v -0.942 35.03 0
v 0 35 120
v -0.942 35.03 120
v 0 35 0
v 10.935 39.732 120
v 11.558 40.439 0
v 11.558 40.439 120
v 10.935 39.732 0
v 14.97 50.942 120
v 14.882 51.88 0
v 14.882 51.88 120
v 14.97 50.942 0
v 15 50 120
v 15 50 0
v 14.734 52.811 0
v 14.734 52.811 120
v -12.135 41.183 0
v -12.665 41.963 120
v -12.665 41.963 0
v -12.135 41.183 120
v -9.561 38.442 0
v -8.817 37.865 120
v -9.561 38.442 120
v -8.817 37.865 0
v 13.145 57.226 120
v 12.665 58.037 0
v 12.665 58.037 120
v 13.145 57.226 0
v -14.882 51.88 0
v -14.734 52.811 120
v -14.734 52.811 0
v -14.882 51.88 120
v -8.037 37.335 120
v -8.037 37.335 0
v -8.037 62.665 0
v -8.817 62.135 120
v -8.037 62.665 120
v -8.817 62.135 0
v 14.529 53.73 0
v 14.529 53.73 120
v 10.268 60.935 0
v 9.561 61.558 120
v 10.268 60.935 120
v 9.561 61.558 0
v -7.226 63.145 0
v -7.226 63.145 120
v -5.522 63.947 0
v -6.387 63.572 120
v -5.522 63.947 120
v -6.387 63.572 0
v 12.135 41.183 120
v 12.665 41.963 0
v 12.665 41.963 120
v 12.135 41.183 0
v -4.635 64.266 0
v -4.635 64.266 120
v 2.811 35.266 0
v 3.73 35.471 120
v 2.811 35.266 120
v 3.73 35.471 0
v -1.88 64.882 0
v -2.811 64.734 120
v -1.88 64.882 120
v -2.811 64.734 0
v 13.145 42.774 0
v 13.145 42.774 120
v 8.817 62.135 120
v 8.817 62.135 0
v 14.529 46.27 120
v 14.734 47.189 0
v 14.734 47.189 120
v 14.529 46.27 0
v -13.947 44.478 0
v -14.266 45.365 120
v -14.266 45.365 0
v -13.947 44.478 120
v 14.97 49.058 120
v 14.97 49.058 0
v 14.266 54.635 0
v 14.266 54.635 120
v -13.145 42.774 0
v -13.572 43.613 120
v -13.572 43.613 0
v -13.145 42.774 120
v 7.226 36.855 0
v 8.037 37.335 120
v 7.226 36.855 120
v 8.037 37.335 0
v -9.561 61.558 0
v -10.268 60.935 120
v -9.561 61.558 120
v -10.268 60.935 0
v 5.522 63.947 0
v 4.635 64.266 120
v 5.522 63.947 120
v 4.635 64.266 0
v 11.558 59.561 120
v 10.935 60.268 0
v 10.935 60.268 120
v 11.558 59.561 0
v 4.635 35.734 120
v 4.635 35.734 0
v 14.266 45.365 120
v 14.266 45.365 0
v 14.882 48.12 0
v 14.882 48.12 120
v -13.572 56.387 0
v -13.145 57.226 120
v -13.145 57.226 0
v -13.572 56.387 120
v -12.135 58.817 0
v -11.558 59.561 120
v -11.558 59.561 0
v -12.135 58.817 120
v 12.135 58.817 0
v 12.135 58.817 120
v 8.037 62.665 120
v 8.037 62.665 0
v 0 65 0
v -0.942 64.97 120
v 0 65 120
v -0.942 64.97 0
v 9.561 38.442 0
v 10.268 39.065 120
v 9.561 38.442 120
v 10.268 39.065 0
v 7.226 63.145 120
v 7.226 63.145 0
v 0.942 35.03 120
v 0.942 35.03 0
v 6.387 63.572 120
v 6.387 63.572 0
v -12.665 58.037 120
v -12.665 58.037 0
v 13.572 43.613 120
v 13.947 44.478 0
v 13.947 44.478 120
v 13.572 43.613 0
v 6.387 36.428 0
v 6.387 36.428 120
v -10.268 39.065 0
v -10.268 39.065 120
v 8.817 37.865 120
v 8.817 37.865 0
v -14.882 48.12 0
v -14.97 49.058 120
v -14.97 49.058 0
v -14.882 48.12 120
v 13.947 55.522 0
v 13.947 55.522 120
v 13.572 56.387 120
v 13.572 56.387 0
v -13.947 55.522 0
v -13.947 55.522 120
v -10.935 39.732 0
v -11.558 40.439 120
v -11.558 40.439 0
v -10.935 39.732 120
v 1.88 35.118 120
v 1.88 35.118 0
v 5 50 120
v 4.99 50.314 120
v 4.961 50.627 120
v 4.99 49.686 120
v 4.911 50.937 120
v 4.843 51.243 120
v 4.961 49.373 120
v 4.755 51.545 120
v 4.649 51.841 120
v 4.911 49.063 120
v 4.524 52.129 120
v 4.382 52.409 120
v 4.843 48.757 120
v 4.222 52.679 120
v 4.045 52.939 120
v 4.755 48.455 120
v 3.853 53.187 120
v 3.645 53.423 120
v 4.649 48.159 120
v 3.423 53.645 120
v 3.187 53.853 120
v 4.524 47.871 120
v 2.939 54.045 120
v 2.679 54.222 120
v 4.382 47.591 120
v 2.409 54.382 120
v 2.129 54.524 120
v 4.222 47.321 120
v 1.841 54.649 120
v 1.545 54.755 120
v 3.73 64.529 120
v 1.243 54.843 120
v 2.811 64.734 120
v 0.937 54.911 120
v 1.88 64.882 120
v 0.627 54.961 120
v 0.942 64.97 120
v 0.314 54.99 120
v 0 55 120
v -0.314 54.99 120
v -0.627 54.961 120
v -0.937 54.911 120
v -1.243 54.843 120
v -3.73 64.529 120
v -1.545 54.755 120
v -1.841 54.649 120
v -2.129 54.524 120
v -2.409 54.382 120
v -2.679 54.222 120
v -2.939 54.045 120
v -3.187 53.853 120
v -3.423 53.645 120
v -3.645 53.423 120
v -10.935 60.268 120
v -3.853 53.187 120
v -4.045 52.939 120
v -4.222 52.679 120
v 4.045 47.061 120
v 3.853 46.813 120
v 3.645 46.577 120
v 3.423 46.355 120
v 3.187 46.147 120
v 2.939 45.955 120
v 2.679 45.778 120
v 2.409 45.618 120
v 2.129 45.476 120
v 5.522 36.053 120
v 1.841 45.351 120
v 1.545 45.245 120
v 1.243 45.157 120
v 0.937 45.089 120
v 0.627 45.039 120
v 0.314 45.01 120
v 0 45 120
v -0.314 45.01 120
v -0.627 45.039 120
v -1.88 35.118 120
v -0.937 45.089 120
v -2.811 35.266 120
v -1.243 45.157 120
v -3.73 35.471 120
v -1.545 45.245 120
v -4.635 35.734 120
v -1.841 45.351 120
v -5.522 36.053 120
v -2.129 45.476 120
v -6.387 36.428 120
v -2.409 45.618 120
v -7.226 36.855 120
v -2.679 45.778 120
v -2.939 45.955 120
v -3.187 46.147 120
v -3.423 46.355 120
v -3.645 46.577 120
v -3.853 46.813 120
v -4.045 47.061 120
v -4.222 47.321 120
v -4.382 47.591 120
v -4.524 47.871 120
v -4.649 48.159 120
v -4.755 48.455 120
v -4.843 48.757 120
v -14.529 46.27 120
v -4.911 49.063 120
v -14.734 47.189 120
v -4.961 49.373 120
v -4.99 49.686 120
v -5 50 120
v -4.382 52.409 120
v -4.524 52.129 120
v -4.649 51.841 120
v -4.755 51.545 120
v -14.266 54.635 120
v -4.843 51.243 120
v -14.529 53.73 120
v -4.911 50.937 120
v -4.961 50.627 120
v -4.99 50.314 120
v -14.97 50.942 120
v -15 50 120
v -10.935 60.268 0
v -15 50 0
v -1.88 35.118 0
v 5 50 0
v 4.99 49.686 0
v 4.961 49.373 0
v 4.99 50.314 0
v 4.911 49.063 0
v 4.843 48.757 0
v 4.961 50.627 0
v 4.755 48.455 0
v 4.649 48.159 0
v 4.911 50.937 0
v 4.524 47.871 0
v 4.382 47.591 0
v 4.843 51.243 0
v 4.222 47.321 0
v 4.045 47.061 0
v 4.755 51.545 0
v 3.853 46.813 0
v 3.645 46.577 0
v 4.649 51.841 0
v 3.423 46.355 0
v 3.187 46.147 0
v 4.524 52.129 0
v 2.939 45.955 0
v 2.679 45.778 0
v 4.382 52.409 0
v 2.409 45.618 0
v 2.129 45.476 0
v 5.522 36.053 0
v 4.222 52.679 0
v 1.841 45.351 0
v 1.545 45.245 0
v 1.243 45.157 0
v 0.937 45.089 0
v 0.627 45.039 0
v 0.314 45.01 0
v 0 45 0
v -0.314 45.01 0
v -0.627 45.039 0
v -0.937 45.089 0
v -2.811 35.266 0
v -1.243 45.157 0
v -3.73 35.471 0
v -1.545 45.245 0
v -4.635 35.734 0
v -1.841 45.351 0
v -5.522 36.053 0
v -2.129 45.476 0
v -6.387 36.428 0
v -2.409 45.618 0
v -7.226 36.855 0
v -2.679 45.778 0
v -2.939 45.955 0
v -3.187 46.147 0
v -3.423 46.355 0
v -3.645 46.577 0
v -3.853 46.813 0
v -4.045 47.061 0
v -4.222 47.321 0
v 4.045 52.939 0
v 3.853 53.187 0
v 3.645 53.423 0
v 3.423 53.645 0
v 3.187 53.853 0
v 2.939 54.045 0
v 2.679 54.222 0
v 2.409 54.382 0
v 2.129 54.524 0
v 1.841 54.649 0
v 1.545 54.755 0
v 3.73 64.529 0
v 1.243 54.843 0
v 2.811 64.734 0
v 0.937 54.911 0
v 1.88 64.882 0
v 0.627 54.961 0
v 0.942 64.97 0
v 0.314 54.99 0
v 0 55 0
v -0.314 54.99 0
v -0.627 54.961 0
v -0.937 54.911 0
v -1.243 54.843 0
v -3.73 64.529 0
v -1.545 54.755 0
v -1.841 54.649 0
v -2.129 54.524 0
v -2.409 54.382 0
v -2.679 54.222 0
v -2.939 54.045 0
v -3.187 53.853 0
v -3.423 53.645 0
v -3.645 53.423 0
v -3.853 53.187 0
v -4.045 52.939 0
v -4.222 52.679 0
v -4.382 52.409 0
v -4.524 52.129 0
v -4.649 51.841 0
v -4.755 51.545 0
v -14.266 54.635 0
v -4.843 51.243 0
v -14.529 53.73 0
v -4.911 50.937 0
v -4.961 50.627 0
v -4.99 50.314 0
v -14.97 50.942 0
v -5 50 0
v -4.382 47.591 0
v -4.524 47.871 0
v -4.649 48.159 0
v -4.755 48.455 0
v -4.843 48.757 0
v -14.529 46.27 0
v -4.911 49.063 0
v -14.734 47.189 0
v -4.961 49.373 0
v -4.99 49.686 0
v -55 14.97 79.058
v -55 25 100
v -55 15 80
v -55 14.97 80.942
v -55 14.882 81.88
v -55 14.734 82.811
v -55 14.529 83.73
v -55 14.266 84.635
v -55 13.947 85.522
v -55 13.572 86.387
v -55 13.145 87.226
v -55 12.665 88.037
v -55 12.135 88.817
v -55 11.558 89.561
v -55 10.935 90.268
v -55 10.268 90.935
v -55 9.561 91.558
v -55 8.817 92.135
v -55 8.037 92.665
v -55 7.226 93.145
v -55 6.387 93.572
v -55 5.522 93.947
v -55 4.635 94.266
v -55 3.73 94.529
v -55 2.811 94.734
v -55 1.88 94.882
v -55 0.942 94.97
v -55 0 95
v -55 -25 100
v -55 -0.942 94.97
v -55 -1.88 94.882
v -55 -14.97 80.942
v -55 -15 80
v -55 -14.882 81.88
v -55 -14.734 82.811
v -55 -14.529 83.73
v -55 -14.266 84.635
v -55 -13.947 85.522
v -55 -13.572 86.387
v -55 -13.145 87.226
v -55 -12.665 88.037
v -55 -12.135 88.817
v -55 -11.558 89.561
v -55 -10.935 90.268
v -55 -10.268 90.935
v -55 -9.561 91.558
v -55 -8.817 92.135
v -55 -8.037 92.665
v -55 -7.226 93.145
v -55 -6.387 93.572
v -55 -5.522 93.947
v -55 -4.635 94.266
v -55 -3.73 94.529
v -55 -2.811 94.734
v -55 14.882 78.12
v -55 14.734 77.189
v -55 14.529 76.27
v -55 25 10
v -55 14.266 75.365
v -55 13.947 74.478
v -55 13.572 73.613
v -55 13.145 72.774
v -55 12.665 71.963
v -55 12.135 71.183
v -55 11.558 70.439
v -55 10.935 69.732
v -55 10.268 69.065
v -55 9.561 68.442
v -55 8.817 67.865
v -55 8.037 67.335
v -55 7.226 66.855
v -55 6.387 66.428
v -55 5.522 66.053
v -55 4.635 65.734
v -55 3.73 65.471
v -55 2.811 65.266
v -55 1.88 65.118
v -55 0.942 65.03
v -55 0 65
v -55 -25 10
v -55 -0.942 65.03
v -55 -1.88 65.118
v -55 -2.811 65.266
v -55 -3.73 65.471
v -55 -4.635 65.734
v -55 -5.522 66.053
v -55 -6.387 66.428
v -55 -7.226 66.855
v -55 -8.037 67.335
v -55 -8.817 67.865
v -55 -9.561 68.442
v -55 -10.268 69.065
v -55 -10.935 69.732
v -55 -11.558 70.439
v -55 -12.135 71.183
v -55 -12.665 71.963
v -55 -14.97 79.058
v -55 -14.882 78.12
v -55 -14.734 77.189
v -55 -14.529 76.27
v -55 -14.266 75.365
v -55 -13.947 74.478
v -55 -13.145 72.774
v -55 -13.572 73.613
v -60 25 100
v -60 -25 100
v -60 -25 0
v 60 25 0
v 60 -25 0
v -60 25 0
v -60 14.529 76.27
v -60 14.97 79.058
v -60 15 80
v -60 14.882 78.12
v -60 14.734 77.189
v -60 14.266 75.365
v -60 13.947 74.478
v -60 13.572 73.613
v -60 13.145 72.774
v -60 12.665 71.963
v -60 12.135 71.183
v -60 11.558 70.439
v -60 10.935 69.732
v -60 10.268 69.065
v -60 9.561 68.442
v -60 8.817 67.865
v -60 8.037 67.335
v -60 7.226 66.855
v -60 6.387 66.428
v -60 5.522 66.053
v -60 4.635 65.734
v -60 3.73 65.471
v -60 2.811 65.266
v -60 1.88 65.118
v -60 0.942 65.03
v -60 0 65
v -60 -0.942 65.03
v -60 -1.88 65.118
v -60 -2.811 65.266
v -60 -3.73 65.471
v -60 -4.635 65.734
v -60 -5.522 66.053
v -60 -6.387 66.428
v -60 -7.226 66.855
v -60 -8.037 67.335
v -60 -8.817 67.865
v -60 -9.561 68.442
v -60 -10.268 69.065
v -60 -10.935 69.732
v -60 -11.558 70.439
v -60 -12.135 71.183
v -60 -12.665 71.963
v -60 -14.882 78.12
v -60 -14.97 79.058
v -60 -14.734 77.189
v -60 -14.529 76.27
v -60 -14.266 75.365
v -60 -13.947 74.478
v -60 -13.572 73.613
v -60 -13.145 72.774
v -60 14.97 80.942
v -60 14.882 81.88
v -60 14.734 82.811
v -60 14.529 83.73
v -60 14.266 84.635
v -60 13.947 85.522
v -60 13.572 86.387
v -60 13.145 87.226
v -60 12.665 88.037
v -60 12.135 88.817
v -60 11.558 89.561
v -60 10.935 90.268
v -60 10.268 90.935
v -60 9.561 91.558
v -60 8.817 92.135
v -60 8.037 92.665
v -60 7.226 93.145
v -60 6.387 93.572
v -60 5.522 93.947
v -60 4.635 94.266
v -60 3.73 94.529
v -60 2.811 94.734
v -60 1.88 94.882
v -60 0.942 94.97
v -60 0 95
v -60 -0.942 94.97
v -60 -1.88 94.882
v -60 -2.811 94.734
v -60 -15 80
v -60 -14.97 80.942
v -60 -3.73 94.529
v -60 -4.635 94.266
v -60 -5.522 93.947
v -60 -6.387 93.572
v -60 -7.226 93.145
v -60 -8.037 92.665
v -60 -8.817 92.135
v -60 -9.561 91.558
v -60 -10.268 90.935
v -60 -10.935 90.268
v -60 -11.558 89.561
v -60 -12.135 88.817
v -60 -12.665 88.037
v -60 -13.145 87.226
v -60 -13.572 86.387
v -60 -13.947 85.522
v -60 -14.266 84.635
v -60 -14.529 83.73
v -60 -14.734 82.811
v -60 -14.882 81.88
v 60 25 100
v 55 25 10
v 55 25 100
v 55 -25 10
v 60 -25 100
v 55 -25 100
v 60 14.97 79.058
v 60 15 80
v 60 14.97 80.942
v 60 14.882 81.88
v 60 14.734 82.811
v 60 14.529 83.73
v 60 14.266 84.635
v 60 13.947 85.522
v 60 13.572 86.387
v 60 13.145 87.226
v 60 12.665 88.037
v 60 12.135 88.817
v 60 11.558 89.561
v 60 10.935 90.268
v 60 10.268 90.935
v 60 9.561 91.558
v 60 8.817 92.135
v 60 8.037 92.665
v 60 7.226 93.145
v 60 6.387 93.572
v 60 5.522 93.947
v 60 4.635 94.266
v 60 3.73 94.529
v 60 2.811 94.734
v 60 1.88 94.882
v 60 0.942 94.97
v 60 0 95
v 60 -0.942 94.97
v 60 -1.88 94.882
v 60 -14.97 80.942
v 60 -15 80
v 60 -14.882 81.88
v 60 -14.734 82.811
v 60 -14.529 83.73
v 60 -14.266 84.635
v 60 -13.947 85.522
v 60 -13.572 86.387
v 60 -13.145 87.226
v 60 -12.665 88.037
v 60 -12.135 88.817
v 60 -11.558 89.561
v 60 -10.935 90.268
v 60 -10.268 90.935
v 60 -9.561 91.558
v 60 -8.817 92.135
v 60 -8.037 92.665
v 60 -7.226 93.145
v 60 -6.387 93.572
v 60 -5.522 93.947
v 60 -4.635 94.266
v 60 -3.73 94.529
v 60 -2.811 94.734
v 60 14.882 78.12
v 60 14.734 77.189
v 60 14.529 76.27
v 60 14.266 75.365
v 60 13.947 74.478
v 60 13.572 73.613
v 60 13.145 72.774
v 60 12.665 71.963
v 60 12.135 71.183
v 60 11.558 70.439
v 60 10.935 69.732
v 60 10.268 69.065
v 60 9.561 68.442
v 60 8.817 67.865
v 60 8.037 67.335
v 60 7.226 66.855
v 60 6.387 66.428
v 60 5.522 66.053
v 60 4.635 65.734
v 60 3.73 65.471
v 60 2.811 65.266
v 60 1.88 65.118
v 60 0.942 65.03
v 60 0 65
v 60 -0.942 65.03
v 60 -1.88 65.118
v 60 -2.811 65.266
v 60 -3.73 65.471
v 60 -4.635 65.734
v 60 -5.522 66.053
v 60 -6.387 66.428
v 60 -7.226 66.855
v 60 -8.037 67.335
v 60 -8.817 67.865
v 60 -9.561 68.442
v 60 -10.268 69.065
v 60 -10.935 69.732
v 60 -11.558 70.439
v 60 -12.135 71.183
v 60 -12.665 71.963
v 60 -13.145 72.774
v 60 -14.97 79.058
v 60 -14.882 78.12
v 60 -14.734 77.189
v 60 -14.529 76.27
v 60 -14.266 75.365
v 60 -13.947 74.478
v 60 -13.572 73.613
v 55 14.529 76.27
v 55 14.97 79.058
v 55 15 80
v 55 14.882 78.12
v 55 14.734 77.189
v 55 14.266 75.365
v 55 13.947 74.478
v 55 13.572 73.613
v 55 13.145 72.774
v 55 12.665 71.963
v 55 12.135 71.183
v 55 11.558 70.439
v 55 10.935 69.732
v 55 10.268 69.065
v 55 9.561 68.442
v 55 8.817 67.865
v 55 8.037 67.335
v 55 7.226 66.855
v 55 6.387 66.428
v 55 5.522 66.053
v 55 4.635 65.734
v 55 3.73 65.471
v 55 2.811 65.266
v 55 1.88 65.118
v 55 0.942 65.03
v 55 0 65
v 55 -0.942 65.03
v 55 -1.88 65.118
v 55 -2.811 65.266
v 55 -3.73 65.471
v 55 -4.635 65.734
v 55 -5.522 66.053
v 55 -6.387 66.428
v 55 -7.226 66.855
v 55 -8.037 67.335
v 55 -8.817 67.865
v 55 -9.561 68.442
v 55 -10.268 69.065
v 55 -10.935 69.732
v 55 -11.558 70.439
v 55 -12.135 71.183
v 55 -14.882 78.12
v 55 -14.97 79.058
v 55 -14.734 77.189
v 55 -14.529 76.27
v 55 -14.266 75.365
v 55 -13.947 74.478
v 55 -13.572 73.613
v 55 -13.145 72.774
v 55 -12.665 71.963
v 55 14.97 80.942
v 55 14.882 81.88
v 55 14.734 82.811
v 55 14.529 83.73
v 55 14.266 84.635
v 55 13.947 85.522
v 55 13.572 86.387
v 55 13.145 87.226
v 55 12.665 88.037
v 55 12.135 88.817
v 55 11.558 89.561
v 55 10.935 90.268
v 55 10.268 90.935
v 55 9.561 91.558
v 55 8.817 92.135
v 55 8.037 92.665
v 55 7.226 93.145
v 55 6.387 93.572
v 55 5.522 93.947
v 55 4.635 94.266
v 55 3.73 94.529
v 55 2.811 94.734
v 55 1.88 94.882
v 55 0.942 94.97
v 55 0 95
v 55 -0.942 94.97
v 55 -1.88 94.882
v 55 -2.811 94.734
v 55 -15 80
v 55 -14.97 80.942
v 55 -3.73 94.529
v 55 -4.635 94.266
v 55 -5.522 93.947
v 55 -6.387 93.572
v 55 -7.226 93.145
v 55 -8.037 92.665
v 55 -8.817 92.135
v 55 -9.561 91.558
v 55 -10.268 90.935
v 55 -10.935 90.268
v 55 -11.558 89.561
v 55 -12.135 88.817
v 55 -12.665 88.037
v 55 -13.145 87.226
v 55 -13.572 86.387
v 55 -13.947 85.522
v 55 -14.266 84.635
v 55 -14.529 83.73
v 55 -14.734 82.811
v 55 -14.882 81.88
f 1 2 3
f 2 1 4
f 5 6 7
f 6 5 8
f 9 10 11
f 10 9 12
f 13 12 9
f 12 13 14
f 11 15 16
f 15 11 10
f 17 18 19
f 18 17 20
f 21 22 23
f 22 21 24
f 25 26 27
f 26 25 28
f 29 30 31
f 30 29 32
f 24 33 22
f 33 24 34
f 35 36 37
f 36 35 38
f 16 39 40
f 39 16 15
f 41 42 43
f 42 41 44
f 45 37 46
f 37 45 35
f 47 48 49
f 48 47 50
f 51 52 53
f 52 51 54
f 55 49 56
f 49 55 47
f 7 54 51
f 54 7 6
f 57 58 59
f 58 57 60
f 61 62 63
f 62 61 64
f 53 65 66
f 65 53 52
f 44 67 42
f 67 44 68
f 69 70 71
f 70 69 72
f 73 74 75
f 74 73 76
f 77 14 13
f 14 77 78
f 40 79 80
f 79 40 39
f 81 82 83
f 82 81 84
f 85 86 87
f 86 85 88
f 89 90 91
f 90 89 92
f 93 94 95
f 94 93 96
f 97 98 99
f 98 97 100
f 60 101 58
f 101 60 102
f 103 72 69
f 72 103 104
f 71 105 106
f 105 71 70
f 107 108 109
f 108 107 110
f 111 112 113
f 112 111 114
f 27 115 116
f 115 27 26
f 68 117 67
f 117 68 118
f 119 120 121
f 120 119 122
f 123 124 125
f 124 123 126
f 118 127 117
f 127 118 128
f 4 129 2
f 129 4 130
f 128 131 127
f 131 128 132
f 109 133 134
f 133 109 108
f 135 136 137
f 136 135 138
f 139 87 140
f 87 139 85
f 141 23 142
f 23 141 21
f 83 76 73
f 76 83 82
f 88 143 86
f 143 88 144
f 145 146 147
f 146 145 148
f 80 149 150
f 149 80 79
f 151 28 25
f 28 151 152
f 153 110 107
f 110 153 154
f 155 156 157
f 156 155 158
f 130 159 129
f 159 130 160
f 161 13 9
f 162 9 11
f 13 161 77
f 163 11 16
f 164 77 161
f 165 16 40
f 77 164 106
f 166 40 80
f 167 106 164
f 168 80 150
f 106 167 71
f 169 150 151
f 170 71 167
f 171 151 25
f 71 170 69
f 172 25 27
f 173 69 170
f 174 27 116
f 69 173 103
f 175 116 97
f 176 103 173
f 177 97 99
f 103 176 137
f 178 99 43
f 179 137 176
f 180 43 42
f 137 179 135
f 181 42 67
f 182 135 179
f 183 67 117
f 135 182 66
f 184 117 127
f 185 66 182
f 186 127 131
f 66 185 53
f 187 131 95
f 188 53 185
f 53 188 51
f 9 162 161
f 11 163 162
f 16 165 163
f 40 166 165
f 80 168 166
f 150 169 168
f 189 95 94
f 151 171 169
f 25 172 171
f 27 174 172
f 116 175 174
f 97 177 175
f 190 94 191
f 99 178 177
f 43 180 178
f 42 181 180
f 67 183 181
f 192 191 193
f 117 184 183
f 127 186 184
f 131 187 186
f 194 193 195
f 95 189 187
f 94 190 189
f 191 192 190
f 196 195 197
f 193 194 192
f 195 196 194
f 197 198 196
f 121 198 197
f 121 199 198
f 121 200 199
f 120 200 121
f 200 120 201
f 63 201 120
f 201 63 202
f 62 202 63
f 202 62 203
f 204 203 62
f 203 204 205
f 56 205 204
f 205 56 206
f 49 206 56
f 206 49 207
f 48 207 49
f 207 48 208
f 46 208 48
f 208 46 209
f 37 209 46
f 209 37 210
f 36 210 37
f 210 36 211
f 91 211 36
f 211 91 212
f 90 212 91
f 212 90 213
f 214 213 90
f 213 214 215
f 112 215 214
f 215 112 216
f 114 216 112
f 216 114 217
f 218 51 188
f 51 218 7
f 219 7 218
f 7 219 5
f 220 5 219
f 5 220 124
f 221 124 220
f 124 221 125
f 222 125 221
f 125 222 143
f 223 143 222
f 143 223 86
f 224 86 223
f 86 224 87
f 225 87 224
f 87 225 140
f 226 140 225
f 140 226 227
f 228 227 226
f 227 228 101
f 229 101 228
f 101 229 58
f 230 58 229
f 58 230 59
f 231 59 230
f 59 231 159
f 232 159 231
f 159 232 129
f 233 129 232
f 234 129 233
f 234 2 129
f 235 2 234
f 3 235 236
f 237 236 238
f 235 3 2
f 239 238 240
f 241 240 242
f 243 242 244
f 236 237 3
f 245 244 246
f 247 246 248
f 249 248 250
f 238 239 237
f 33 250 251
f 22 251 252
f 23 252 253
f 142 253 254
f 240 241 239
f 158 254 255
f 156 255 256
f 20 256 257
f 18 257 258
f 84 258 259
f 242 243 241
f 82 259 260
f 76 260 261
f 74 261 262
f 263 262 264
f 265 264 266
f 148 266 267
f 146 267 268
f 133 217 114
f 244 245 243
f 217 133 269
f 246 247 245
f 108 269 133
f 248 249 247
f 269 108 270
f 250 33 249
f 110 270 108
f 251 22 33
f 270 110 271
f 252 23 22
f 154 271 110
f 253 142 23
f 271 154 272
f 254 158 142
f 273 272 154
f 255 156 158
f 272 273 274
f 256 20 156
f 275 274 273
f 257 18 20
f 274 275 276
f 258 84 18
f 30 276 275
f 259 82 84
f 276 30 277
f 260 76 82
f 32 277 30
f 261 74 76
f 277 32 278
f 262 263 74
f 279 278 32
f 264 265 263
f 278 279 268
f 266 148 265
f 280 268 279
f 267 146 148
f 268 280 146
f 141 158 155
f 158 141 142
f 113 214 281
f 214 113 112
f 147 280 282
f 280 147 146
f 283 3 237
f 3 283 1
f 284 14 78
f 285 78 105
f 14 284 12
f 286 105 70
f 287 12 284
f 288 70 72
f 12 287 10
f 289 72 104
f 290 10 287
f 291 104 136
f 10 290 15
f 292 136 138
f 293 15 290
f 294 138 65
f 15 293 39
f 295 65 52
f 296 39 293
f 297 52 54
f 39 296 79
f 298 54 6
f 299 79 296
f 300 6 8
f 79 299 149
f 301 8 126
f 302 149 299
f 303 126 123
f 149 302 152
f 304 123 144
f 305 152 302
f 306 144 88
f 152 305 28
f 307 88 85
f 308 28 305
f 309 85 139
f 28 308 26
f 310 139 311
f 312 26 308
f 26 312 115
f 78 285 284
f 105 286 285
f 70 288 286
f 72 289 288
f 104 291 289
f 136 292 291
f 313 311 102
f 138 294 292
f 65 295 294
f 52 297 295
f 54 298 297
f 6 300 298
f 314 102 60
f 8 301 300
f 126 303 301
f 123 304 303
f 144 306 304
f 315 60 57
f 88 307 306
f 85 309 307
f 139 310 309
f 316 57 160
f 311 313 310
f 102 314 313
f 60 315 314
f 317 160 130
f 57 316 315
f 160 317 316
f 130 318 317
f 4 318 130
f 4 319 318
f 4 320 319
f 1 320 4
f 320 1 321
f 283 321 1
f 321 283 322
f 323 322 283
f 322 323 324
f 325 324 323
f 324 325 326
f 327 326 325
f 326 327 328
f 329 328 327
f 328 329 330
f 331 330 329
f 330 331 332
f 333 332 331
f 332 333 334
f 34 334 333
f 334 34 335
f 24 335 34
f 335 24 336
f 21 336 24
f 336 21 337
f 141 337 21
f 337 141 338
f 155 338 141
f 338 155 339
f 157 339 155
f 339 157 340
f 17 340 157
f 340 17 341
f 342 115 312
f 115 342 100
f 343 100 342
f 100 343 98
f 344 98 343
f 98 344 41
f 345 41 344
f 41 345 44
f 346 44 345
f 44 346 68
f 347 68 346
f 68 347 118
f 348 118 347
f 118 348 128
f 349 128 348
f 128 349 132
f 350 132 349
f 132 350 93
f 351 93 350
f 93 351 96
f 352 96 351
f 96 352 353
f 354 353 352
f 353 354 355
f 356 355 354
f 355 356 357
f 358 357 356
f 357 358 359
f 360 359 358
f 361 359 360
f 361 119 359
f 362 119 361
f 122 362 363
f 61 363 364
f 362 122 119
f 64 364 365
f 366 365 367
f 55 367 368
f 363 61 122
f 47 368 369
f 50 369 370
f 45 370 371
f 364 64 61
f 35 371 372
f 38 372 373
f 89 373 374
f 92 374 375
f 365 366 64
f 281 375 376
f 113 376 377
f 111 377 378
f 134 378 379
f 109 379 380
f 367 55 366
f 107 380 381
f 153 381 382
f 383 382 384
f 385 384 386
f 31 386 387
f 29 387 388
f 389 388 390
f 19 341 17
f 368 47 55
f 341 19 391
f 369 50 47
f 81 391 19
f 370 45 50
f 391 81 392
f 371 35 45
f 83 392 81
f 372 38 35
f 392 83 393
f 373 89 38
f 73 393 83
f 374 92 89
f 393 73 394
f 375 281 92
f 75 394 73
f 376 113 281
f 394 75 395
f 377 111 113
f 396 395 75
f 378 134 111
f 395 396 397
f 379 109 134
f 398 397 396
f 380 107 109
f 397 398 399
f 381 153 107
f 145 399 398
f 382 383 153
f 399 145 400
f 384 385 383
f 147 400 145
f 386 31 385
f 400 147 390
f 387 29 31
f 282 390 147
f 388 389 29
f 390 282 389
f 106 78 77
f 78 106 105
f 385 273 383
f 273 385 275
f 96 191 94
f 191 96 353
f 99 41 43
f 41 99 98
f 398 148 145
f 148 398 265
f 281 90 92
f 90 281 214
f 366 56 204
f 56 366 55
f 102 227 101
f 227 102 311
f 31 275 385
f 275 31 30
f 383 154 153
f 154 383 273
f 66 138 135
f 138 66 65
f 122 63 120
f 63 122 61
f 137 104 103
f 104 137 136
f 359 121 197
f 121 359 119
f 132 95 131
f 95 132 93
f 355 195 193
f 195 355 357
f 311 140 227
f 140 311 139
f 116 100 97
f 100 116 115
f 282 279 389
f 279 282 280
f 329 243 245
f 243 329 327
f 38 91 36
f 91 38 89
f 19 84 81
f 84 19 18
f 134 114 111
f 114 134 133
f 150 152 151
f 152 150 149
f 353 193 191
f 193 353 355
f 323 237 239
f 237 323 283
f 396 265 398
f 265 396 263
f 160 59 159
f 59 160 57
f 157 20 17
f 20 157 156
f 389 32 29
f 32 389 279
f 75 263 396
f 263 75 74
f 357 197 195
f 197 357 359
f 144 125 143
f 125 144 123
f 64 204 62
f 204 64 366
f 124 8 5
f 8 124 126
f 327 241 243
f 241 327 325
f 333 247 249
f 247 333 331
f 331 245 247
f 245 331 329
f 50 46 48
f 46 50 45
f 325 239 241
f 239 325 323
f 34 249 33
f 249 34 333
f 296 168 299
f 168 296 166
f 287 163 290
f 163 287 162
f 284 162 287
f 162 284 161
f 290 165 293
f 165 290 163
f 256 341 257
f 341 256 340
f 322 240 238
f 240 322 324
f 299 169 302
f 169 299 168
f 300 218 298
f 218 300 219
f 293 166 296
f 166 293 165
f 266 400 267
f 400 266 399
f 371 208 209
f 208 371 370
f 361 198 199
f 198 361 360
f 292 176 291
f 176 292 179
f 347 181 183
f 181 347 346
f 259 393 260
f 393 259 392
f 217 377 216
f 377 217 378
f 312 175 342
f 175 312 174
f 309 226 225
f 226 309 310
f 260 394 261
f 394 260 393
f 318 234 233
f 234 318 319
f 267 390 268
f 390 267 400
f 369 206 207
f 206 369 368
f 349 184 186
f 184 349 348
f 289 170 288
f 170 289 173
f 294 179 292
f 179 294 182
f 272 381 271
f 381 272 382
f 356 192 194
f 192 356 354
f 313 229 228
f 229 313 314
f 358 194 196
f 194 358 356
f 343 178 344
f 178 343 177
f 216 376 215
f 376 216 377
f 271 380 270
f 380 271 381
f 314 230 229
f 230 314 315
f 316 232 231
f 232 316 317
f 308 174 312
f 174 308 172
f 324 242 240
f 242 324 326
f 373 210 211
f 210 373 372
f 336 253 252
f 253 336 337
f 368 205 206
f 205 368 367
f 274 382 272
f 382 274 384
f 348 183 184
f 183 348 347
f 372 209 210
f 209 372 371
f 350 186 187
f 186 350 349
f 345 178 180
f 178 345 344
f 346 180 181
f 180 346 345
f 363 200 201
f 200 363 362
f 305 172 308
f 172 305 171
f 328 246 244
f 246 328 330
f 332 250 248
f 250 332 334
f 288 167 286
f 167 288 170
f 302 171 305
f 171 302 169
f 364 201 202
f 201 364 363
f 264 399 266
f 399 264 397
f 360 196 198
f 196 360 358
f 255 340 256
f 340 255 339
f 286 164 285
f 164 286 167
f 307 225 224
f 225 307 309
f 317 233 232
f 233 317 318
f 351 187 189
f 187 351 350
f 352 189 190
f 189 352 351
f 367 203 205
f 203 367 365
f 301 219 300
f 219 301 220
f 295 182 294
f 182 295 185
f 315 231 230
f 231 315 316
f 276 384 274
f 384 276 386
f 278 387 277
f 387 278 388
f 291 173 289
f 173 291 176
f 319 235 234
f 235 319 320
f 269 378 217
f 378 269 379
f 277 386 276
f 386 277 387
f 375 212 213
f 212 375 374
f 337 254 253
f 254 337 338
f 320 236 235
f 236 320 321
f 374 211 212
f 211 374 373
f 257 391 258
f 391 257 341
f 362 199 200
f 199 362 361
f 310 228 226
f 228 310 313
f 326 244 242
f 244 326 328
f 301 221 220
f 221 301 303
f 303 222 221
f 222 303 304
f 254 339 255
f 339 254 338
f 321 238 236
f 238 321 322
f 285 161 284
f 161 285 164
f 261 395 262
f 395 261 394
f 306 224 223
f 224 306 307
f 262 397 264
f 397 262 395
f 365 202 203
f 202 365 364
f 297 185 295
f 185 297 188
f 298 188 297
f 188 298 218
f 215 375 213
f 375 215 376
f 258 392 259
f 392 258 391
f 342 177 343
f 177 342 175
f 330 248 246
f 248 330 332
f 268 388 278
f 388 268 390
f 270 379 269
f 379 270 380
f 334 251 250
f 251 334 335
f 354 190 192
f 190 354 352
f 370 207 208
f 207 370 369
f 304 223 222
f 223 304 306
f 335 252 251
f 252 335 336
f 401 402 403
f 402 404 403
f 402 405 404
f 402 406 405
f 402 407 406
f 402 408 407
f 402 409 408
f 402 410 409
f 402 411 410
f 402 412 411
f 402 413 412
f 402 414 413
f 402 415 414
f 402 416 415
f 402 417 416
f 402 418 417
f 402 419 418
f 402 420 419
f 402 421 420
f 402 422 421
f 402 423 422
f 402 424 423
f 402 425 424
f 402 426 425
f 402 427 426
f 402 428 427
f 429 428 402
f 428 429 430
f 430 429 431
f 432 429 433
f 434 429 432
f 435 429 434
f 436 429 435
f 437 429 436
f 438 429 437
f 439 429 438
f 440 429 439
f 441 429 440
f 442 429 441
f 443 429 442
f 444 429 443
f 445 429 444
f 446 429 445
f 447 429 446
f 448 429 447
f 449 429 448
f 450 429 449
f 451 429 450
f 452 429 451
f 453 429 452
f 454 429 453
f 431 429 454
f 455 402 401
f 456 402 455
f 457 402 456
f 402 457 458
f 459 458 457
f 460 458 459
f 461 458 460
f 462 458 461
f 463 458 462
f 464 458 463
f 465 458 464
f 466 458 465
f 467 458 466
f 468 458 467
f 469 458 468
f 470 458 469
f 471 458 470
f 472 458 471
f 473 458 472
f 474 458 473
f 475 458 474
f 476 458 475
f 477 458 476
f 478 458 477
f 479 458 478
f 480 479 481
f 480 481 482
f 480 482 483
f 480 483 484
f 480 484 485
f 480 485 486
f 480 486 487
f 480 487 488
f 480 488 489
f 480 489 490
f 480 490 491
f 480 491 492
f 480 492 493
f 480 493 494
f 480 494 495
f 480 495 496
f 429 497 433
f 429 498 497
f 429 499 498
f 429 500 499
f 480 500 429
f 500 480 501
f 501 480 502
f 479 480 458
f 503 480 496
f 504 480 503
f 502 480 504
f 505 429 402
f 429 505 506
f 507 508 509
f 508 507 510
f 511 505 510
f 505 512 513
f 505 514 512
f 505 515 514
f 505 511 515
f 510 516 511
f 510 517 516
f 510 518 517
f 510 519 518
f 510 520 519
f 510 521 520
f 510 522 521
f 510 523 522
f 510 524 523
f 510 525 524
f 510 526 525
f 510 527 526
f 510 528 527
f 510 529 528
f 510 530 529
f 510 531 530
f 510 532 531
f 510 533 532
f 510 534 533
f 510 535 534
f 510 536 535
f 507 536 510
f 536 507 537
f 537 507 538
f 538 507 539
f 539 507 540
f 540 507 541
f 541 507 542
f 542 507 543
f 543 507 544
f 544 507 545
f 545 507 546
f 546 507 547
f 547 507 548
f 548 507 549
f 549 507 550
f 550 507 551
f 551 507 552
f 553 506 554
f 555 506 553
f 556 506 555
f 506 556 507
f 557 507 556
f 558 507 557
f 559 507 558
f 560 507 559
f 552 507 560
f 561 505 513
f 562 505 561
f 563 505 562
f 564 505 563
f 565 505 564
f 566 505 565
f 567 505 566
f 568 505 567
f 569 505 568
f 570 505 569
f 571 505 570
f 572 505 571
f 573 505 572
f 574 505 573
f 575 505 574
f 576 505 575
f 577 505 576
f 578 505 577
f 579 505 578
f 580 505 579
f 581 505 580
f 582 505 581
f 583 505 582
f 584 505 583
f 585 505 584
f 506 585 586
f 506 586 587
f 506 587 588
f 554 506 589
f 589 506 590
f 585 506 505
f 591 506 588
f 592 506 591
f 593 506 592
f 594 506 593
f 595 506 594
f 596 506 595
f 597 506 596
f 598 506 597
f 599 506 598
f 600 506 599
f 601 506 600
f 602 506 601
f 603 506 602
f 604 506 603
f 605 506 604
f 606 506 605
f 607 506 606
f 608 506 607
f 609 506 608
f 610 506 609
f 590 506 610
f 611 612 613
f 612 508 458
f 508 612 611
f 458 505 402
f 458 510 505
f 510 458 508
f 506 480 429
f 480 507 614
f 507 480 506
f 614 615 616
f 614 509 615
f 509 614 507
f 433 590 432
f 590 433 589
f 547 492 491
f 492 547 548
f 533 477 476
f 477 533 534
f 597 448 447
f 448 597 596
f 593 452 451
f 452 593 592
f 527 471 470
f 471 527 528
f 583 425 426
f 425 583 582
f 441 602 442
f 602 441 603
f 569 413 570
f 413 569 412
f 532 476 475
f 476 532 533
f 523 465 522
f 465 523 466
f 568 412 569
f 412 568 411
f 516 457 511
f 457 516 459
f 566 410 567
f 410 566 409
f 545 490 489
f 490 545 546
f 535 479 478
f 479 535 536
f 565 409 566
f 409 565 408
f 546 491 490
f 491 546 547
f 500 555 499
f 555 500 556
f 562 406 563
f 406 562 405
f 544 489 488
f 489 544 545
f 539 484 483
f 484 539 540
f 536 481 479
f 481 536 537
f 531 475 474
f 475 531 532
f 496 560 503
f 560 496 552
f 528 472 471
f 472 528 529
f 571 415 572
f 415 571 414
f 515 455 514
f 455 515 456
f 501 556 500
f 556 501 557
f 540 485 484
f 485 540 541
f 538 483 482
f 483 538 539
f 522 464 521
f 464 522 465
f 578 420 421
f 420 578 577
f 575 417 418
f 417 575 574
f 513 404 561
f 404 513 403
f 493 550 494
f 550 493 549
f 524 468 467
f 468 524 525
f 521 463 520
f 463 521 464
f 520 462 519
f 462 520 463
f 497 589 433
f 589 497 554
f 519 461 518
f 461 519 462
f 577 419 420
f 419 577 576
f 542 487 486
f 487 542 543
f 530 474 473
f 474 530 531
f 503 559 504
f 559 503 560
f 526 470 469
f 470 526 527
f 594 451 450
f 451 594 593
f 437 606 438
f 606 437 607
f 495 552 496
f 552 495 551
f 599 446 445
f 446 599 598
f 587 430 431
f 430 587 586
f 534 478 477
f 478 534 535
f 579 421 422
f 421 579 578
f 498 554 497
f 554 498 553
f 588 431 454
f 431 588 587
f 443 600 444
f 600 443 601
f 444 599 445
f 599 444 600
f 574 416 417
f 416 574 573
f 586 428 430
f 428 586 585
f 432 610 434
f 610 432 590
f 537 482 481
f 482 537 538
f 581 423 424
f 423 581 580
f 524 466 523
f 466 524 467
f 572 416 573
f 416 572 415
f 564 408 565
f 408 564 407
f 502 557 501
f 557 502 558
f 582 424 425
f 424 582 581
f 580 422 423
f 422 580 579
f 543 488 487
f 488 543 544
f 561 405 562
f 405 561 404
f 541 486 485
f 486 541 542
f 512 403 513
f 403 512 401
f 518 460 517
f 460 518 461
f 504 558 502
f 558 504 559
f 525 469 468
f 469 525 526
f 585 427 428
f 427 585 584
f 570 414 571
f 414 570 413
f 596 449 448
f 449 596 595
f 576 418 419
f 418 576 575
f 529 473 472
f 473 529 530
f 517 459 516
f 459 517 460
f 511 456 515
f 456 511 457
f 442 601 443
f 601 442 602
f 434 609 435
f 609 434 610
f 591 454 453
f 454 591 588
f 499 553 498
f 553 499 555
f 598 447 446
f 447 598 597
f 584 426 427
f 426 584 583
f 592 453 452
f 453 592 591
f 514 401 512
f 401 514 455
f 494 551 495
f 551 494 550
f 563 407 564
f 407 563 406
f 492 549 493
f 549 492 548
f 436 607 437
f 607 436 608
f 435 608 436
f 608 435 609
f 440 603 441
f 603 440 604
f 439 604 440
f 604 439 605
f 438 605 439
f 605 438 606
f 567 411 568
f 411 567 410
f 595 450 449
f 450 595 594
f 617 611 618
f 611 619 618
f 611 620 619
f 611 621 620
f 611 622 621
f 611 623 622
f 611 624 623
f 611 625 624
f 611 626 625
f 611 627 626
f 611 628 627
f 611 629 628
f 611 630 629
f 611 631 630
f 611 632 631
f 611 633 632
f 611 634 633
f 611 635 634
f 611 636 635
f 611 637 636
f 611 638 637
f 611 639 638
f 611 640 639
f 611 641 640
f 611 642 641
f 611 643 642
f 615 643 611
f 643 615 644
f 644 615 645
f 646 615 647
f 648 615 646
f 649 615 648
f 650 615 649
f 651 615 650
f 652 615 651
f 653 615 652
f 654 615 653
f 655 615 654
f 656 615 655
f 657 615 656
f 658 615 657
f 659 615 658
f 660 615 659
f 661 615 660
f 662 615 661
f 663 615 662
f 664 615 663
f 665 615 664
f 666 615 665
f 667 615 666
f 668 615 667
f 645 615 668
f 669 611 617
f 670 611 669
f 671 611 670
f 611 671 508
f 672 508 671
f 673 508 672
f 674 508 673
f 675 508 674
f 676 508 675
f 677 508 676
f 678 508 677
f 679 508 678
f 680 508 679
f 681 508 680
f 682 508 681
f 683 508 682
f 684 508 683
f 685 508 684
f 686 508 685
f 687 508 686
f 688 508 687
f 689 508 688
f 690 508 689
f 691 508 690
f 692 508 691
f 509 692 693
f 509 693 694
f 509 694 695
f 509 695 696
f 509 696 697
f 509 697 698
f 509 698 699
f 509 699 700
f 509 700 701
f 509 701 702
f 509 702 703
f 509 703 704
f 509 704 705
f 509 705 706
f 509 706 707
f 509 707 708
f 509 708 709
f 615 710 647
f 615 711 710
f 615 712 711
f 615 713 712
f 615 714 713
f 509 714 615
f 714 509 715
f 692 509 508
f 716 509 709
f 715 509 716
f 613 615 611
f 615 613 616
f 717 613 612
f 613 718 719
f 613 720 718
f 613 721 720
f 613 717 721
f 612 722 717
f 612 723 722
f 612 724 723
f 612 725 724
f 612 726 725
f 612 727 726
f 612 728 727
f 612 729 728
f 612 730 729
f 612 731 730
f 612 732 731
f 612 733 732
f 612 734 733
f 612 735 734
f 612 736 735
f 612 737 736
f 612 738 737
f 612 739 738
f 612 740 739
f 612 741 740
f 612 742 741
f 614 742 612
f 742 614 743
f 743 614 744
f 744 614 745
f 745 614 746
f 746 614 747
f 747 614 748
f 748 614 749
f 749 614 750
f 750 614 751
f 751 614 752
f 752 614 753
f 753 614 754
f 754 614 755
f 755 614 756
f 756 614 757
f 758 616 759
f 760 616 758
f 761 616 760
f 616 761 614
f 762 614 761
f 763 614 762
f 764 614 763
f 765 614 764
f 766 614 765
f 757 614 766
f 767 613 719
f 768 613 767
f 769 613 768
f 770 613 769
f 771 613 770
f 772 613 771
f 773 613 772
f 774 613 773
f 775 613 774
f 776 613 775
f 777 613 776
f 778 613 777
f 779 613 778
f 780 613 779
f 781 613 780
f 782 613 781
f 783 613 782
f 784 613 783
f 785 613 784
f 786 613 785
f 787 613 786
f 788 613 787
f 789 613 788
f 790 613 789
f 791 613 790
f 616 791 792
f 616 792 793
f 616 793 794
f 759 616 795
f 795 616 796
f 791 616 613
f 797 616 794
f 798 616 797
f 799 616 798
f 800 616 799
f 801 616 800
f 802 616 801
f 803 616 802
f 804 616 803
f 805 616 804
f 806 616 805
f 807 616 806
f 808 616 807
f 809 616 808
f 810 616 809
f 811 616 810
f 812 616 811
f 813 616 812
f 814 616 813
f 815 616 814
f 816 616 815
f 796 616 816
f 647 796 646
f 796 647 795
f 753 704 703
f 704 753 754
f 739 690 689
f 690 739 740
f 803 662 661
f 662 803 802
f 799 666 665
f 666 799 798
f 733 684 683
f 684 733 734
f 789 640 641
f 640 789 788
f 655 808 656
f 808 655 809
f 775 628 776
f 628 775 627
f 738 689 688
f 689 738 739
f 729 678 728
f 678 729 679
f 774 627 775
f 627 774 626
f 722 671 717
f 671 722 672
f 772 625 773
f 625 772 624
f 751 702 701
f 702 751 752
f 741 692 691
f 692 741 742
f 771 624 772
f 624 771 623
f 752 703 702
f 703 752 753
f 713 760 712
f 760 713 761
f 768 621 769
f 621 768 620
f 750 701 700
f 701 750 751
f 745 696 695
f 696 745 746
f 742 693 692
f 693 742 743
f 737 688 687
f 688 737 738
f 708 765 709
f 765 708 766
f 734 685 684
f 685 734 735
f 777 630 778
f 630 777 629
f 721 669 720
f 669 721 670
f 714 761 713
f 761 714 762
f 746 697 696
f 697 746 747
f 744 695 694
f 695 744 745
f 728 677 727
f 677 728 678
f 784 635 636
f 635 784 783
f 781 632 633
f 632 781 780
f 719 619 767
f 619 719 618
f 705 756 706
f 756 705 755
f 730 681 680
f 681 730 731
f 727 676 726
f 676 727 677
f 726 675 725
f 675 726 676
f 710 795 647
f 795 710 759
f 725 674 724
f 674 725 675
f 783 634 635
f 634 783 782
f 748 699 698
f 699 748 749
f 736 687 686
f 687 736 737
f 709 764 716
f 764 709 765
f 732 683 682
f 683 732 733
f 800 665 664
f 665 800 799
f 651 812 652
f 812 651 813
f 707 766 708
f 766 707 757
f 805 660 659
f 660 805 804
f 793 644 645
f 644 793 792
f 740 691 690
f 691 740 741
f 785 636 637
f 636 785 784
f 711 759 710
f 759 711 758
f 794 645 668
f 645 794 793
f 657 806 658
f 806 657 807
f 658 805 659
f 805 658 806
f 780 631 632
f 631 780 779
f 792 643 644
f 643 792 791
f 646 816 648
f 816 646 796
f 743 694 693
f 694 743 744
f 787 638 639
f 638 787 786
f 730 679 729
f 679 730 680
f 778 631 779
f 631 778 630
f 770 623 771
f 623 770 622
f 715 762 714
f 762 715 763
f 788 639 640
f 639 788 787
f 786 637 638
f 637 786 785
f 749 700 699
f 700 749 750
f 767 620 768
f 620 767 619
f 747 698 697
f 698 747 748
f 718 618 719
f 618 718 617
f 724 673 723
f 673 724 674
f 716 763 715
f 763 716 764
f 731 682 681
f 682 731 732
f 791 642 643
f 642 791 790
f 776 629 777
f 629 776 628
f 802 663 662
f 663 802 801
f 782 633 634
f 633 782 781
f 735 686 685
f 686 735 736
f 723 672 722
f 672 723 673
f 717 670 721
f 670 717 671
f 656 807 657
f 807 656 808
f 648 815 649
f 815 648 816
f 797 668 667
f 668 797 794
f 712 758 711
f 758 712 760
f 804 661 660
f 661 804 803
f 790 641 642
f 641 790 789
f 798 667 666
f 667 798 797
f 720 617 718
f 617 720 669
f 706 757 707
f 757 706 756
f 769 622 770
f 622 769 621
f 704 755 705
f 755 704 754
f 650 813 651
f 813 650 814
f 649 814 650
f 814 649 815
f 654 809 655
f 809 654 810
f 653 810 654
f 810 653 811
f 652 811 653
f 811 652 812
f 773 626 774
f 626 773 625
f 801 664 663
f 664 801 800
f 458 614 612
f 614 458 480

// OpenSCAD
translate([0,50,60])
difference() {
    cylinder(h=120, r=15, $fn=100, center=true);
    cylinder(h=140, r=5, $fn=100, center=true);
}
    


union(){
    translate([-57.5,0,50])
    difference() {
        cube([5,50,100],true);
        translate([0, 0, 30])
        rotate([0,90,0])
        cylinder(h=30, r=15, $fn=100, center=true);
    }
    
    translate([57.5,0,50])
    difference() {
        cube([5,50,100],true);
        translate([0, 0, 30])
        rotate([0,90,0])
        cylinder(h=30, r=15, $fn=100, center=true);
    }
    
    translate([0,0,5])
    cube([120,50,10],true);
}
